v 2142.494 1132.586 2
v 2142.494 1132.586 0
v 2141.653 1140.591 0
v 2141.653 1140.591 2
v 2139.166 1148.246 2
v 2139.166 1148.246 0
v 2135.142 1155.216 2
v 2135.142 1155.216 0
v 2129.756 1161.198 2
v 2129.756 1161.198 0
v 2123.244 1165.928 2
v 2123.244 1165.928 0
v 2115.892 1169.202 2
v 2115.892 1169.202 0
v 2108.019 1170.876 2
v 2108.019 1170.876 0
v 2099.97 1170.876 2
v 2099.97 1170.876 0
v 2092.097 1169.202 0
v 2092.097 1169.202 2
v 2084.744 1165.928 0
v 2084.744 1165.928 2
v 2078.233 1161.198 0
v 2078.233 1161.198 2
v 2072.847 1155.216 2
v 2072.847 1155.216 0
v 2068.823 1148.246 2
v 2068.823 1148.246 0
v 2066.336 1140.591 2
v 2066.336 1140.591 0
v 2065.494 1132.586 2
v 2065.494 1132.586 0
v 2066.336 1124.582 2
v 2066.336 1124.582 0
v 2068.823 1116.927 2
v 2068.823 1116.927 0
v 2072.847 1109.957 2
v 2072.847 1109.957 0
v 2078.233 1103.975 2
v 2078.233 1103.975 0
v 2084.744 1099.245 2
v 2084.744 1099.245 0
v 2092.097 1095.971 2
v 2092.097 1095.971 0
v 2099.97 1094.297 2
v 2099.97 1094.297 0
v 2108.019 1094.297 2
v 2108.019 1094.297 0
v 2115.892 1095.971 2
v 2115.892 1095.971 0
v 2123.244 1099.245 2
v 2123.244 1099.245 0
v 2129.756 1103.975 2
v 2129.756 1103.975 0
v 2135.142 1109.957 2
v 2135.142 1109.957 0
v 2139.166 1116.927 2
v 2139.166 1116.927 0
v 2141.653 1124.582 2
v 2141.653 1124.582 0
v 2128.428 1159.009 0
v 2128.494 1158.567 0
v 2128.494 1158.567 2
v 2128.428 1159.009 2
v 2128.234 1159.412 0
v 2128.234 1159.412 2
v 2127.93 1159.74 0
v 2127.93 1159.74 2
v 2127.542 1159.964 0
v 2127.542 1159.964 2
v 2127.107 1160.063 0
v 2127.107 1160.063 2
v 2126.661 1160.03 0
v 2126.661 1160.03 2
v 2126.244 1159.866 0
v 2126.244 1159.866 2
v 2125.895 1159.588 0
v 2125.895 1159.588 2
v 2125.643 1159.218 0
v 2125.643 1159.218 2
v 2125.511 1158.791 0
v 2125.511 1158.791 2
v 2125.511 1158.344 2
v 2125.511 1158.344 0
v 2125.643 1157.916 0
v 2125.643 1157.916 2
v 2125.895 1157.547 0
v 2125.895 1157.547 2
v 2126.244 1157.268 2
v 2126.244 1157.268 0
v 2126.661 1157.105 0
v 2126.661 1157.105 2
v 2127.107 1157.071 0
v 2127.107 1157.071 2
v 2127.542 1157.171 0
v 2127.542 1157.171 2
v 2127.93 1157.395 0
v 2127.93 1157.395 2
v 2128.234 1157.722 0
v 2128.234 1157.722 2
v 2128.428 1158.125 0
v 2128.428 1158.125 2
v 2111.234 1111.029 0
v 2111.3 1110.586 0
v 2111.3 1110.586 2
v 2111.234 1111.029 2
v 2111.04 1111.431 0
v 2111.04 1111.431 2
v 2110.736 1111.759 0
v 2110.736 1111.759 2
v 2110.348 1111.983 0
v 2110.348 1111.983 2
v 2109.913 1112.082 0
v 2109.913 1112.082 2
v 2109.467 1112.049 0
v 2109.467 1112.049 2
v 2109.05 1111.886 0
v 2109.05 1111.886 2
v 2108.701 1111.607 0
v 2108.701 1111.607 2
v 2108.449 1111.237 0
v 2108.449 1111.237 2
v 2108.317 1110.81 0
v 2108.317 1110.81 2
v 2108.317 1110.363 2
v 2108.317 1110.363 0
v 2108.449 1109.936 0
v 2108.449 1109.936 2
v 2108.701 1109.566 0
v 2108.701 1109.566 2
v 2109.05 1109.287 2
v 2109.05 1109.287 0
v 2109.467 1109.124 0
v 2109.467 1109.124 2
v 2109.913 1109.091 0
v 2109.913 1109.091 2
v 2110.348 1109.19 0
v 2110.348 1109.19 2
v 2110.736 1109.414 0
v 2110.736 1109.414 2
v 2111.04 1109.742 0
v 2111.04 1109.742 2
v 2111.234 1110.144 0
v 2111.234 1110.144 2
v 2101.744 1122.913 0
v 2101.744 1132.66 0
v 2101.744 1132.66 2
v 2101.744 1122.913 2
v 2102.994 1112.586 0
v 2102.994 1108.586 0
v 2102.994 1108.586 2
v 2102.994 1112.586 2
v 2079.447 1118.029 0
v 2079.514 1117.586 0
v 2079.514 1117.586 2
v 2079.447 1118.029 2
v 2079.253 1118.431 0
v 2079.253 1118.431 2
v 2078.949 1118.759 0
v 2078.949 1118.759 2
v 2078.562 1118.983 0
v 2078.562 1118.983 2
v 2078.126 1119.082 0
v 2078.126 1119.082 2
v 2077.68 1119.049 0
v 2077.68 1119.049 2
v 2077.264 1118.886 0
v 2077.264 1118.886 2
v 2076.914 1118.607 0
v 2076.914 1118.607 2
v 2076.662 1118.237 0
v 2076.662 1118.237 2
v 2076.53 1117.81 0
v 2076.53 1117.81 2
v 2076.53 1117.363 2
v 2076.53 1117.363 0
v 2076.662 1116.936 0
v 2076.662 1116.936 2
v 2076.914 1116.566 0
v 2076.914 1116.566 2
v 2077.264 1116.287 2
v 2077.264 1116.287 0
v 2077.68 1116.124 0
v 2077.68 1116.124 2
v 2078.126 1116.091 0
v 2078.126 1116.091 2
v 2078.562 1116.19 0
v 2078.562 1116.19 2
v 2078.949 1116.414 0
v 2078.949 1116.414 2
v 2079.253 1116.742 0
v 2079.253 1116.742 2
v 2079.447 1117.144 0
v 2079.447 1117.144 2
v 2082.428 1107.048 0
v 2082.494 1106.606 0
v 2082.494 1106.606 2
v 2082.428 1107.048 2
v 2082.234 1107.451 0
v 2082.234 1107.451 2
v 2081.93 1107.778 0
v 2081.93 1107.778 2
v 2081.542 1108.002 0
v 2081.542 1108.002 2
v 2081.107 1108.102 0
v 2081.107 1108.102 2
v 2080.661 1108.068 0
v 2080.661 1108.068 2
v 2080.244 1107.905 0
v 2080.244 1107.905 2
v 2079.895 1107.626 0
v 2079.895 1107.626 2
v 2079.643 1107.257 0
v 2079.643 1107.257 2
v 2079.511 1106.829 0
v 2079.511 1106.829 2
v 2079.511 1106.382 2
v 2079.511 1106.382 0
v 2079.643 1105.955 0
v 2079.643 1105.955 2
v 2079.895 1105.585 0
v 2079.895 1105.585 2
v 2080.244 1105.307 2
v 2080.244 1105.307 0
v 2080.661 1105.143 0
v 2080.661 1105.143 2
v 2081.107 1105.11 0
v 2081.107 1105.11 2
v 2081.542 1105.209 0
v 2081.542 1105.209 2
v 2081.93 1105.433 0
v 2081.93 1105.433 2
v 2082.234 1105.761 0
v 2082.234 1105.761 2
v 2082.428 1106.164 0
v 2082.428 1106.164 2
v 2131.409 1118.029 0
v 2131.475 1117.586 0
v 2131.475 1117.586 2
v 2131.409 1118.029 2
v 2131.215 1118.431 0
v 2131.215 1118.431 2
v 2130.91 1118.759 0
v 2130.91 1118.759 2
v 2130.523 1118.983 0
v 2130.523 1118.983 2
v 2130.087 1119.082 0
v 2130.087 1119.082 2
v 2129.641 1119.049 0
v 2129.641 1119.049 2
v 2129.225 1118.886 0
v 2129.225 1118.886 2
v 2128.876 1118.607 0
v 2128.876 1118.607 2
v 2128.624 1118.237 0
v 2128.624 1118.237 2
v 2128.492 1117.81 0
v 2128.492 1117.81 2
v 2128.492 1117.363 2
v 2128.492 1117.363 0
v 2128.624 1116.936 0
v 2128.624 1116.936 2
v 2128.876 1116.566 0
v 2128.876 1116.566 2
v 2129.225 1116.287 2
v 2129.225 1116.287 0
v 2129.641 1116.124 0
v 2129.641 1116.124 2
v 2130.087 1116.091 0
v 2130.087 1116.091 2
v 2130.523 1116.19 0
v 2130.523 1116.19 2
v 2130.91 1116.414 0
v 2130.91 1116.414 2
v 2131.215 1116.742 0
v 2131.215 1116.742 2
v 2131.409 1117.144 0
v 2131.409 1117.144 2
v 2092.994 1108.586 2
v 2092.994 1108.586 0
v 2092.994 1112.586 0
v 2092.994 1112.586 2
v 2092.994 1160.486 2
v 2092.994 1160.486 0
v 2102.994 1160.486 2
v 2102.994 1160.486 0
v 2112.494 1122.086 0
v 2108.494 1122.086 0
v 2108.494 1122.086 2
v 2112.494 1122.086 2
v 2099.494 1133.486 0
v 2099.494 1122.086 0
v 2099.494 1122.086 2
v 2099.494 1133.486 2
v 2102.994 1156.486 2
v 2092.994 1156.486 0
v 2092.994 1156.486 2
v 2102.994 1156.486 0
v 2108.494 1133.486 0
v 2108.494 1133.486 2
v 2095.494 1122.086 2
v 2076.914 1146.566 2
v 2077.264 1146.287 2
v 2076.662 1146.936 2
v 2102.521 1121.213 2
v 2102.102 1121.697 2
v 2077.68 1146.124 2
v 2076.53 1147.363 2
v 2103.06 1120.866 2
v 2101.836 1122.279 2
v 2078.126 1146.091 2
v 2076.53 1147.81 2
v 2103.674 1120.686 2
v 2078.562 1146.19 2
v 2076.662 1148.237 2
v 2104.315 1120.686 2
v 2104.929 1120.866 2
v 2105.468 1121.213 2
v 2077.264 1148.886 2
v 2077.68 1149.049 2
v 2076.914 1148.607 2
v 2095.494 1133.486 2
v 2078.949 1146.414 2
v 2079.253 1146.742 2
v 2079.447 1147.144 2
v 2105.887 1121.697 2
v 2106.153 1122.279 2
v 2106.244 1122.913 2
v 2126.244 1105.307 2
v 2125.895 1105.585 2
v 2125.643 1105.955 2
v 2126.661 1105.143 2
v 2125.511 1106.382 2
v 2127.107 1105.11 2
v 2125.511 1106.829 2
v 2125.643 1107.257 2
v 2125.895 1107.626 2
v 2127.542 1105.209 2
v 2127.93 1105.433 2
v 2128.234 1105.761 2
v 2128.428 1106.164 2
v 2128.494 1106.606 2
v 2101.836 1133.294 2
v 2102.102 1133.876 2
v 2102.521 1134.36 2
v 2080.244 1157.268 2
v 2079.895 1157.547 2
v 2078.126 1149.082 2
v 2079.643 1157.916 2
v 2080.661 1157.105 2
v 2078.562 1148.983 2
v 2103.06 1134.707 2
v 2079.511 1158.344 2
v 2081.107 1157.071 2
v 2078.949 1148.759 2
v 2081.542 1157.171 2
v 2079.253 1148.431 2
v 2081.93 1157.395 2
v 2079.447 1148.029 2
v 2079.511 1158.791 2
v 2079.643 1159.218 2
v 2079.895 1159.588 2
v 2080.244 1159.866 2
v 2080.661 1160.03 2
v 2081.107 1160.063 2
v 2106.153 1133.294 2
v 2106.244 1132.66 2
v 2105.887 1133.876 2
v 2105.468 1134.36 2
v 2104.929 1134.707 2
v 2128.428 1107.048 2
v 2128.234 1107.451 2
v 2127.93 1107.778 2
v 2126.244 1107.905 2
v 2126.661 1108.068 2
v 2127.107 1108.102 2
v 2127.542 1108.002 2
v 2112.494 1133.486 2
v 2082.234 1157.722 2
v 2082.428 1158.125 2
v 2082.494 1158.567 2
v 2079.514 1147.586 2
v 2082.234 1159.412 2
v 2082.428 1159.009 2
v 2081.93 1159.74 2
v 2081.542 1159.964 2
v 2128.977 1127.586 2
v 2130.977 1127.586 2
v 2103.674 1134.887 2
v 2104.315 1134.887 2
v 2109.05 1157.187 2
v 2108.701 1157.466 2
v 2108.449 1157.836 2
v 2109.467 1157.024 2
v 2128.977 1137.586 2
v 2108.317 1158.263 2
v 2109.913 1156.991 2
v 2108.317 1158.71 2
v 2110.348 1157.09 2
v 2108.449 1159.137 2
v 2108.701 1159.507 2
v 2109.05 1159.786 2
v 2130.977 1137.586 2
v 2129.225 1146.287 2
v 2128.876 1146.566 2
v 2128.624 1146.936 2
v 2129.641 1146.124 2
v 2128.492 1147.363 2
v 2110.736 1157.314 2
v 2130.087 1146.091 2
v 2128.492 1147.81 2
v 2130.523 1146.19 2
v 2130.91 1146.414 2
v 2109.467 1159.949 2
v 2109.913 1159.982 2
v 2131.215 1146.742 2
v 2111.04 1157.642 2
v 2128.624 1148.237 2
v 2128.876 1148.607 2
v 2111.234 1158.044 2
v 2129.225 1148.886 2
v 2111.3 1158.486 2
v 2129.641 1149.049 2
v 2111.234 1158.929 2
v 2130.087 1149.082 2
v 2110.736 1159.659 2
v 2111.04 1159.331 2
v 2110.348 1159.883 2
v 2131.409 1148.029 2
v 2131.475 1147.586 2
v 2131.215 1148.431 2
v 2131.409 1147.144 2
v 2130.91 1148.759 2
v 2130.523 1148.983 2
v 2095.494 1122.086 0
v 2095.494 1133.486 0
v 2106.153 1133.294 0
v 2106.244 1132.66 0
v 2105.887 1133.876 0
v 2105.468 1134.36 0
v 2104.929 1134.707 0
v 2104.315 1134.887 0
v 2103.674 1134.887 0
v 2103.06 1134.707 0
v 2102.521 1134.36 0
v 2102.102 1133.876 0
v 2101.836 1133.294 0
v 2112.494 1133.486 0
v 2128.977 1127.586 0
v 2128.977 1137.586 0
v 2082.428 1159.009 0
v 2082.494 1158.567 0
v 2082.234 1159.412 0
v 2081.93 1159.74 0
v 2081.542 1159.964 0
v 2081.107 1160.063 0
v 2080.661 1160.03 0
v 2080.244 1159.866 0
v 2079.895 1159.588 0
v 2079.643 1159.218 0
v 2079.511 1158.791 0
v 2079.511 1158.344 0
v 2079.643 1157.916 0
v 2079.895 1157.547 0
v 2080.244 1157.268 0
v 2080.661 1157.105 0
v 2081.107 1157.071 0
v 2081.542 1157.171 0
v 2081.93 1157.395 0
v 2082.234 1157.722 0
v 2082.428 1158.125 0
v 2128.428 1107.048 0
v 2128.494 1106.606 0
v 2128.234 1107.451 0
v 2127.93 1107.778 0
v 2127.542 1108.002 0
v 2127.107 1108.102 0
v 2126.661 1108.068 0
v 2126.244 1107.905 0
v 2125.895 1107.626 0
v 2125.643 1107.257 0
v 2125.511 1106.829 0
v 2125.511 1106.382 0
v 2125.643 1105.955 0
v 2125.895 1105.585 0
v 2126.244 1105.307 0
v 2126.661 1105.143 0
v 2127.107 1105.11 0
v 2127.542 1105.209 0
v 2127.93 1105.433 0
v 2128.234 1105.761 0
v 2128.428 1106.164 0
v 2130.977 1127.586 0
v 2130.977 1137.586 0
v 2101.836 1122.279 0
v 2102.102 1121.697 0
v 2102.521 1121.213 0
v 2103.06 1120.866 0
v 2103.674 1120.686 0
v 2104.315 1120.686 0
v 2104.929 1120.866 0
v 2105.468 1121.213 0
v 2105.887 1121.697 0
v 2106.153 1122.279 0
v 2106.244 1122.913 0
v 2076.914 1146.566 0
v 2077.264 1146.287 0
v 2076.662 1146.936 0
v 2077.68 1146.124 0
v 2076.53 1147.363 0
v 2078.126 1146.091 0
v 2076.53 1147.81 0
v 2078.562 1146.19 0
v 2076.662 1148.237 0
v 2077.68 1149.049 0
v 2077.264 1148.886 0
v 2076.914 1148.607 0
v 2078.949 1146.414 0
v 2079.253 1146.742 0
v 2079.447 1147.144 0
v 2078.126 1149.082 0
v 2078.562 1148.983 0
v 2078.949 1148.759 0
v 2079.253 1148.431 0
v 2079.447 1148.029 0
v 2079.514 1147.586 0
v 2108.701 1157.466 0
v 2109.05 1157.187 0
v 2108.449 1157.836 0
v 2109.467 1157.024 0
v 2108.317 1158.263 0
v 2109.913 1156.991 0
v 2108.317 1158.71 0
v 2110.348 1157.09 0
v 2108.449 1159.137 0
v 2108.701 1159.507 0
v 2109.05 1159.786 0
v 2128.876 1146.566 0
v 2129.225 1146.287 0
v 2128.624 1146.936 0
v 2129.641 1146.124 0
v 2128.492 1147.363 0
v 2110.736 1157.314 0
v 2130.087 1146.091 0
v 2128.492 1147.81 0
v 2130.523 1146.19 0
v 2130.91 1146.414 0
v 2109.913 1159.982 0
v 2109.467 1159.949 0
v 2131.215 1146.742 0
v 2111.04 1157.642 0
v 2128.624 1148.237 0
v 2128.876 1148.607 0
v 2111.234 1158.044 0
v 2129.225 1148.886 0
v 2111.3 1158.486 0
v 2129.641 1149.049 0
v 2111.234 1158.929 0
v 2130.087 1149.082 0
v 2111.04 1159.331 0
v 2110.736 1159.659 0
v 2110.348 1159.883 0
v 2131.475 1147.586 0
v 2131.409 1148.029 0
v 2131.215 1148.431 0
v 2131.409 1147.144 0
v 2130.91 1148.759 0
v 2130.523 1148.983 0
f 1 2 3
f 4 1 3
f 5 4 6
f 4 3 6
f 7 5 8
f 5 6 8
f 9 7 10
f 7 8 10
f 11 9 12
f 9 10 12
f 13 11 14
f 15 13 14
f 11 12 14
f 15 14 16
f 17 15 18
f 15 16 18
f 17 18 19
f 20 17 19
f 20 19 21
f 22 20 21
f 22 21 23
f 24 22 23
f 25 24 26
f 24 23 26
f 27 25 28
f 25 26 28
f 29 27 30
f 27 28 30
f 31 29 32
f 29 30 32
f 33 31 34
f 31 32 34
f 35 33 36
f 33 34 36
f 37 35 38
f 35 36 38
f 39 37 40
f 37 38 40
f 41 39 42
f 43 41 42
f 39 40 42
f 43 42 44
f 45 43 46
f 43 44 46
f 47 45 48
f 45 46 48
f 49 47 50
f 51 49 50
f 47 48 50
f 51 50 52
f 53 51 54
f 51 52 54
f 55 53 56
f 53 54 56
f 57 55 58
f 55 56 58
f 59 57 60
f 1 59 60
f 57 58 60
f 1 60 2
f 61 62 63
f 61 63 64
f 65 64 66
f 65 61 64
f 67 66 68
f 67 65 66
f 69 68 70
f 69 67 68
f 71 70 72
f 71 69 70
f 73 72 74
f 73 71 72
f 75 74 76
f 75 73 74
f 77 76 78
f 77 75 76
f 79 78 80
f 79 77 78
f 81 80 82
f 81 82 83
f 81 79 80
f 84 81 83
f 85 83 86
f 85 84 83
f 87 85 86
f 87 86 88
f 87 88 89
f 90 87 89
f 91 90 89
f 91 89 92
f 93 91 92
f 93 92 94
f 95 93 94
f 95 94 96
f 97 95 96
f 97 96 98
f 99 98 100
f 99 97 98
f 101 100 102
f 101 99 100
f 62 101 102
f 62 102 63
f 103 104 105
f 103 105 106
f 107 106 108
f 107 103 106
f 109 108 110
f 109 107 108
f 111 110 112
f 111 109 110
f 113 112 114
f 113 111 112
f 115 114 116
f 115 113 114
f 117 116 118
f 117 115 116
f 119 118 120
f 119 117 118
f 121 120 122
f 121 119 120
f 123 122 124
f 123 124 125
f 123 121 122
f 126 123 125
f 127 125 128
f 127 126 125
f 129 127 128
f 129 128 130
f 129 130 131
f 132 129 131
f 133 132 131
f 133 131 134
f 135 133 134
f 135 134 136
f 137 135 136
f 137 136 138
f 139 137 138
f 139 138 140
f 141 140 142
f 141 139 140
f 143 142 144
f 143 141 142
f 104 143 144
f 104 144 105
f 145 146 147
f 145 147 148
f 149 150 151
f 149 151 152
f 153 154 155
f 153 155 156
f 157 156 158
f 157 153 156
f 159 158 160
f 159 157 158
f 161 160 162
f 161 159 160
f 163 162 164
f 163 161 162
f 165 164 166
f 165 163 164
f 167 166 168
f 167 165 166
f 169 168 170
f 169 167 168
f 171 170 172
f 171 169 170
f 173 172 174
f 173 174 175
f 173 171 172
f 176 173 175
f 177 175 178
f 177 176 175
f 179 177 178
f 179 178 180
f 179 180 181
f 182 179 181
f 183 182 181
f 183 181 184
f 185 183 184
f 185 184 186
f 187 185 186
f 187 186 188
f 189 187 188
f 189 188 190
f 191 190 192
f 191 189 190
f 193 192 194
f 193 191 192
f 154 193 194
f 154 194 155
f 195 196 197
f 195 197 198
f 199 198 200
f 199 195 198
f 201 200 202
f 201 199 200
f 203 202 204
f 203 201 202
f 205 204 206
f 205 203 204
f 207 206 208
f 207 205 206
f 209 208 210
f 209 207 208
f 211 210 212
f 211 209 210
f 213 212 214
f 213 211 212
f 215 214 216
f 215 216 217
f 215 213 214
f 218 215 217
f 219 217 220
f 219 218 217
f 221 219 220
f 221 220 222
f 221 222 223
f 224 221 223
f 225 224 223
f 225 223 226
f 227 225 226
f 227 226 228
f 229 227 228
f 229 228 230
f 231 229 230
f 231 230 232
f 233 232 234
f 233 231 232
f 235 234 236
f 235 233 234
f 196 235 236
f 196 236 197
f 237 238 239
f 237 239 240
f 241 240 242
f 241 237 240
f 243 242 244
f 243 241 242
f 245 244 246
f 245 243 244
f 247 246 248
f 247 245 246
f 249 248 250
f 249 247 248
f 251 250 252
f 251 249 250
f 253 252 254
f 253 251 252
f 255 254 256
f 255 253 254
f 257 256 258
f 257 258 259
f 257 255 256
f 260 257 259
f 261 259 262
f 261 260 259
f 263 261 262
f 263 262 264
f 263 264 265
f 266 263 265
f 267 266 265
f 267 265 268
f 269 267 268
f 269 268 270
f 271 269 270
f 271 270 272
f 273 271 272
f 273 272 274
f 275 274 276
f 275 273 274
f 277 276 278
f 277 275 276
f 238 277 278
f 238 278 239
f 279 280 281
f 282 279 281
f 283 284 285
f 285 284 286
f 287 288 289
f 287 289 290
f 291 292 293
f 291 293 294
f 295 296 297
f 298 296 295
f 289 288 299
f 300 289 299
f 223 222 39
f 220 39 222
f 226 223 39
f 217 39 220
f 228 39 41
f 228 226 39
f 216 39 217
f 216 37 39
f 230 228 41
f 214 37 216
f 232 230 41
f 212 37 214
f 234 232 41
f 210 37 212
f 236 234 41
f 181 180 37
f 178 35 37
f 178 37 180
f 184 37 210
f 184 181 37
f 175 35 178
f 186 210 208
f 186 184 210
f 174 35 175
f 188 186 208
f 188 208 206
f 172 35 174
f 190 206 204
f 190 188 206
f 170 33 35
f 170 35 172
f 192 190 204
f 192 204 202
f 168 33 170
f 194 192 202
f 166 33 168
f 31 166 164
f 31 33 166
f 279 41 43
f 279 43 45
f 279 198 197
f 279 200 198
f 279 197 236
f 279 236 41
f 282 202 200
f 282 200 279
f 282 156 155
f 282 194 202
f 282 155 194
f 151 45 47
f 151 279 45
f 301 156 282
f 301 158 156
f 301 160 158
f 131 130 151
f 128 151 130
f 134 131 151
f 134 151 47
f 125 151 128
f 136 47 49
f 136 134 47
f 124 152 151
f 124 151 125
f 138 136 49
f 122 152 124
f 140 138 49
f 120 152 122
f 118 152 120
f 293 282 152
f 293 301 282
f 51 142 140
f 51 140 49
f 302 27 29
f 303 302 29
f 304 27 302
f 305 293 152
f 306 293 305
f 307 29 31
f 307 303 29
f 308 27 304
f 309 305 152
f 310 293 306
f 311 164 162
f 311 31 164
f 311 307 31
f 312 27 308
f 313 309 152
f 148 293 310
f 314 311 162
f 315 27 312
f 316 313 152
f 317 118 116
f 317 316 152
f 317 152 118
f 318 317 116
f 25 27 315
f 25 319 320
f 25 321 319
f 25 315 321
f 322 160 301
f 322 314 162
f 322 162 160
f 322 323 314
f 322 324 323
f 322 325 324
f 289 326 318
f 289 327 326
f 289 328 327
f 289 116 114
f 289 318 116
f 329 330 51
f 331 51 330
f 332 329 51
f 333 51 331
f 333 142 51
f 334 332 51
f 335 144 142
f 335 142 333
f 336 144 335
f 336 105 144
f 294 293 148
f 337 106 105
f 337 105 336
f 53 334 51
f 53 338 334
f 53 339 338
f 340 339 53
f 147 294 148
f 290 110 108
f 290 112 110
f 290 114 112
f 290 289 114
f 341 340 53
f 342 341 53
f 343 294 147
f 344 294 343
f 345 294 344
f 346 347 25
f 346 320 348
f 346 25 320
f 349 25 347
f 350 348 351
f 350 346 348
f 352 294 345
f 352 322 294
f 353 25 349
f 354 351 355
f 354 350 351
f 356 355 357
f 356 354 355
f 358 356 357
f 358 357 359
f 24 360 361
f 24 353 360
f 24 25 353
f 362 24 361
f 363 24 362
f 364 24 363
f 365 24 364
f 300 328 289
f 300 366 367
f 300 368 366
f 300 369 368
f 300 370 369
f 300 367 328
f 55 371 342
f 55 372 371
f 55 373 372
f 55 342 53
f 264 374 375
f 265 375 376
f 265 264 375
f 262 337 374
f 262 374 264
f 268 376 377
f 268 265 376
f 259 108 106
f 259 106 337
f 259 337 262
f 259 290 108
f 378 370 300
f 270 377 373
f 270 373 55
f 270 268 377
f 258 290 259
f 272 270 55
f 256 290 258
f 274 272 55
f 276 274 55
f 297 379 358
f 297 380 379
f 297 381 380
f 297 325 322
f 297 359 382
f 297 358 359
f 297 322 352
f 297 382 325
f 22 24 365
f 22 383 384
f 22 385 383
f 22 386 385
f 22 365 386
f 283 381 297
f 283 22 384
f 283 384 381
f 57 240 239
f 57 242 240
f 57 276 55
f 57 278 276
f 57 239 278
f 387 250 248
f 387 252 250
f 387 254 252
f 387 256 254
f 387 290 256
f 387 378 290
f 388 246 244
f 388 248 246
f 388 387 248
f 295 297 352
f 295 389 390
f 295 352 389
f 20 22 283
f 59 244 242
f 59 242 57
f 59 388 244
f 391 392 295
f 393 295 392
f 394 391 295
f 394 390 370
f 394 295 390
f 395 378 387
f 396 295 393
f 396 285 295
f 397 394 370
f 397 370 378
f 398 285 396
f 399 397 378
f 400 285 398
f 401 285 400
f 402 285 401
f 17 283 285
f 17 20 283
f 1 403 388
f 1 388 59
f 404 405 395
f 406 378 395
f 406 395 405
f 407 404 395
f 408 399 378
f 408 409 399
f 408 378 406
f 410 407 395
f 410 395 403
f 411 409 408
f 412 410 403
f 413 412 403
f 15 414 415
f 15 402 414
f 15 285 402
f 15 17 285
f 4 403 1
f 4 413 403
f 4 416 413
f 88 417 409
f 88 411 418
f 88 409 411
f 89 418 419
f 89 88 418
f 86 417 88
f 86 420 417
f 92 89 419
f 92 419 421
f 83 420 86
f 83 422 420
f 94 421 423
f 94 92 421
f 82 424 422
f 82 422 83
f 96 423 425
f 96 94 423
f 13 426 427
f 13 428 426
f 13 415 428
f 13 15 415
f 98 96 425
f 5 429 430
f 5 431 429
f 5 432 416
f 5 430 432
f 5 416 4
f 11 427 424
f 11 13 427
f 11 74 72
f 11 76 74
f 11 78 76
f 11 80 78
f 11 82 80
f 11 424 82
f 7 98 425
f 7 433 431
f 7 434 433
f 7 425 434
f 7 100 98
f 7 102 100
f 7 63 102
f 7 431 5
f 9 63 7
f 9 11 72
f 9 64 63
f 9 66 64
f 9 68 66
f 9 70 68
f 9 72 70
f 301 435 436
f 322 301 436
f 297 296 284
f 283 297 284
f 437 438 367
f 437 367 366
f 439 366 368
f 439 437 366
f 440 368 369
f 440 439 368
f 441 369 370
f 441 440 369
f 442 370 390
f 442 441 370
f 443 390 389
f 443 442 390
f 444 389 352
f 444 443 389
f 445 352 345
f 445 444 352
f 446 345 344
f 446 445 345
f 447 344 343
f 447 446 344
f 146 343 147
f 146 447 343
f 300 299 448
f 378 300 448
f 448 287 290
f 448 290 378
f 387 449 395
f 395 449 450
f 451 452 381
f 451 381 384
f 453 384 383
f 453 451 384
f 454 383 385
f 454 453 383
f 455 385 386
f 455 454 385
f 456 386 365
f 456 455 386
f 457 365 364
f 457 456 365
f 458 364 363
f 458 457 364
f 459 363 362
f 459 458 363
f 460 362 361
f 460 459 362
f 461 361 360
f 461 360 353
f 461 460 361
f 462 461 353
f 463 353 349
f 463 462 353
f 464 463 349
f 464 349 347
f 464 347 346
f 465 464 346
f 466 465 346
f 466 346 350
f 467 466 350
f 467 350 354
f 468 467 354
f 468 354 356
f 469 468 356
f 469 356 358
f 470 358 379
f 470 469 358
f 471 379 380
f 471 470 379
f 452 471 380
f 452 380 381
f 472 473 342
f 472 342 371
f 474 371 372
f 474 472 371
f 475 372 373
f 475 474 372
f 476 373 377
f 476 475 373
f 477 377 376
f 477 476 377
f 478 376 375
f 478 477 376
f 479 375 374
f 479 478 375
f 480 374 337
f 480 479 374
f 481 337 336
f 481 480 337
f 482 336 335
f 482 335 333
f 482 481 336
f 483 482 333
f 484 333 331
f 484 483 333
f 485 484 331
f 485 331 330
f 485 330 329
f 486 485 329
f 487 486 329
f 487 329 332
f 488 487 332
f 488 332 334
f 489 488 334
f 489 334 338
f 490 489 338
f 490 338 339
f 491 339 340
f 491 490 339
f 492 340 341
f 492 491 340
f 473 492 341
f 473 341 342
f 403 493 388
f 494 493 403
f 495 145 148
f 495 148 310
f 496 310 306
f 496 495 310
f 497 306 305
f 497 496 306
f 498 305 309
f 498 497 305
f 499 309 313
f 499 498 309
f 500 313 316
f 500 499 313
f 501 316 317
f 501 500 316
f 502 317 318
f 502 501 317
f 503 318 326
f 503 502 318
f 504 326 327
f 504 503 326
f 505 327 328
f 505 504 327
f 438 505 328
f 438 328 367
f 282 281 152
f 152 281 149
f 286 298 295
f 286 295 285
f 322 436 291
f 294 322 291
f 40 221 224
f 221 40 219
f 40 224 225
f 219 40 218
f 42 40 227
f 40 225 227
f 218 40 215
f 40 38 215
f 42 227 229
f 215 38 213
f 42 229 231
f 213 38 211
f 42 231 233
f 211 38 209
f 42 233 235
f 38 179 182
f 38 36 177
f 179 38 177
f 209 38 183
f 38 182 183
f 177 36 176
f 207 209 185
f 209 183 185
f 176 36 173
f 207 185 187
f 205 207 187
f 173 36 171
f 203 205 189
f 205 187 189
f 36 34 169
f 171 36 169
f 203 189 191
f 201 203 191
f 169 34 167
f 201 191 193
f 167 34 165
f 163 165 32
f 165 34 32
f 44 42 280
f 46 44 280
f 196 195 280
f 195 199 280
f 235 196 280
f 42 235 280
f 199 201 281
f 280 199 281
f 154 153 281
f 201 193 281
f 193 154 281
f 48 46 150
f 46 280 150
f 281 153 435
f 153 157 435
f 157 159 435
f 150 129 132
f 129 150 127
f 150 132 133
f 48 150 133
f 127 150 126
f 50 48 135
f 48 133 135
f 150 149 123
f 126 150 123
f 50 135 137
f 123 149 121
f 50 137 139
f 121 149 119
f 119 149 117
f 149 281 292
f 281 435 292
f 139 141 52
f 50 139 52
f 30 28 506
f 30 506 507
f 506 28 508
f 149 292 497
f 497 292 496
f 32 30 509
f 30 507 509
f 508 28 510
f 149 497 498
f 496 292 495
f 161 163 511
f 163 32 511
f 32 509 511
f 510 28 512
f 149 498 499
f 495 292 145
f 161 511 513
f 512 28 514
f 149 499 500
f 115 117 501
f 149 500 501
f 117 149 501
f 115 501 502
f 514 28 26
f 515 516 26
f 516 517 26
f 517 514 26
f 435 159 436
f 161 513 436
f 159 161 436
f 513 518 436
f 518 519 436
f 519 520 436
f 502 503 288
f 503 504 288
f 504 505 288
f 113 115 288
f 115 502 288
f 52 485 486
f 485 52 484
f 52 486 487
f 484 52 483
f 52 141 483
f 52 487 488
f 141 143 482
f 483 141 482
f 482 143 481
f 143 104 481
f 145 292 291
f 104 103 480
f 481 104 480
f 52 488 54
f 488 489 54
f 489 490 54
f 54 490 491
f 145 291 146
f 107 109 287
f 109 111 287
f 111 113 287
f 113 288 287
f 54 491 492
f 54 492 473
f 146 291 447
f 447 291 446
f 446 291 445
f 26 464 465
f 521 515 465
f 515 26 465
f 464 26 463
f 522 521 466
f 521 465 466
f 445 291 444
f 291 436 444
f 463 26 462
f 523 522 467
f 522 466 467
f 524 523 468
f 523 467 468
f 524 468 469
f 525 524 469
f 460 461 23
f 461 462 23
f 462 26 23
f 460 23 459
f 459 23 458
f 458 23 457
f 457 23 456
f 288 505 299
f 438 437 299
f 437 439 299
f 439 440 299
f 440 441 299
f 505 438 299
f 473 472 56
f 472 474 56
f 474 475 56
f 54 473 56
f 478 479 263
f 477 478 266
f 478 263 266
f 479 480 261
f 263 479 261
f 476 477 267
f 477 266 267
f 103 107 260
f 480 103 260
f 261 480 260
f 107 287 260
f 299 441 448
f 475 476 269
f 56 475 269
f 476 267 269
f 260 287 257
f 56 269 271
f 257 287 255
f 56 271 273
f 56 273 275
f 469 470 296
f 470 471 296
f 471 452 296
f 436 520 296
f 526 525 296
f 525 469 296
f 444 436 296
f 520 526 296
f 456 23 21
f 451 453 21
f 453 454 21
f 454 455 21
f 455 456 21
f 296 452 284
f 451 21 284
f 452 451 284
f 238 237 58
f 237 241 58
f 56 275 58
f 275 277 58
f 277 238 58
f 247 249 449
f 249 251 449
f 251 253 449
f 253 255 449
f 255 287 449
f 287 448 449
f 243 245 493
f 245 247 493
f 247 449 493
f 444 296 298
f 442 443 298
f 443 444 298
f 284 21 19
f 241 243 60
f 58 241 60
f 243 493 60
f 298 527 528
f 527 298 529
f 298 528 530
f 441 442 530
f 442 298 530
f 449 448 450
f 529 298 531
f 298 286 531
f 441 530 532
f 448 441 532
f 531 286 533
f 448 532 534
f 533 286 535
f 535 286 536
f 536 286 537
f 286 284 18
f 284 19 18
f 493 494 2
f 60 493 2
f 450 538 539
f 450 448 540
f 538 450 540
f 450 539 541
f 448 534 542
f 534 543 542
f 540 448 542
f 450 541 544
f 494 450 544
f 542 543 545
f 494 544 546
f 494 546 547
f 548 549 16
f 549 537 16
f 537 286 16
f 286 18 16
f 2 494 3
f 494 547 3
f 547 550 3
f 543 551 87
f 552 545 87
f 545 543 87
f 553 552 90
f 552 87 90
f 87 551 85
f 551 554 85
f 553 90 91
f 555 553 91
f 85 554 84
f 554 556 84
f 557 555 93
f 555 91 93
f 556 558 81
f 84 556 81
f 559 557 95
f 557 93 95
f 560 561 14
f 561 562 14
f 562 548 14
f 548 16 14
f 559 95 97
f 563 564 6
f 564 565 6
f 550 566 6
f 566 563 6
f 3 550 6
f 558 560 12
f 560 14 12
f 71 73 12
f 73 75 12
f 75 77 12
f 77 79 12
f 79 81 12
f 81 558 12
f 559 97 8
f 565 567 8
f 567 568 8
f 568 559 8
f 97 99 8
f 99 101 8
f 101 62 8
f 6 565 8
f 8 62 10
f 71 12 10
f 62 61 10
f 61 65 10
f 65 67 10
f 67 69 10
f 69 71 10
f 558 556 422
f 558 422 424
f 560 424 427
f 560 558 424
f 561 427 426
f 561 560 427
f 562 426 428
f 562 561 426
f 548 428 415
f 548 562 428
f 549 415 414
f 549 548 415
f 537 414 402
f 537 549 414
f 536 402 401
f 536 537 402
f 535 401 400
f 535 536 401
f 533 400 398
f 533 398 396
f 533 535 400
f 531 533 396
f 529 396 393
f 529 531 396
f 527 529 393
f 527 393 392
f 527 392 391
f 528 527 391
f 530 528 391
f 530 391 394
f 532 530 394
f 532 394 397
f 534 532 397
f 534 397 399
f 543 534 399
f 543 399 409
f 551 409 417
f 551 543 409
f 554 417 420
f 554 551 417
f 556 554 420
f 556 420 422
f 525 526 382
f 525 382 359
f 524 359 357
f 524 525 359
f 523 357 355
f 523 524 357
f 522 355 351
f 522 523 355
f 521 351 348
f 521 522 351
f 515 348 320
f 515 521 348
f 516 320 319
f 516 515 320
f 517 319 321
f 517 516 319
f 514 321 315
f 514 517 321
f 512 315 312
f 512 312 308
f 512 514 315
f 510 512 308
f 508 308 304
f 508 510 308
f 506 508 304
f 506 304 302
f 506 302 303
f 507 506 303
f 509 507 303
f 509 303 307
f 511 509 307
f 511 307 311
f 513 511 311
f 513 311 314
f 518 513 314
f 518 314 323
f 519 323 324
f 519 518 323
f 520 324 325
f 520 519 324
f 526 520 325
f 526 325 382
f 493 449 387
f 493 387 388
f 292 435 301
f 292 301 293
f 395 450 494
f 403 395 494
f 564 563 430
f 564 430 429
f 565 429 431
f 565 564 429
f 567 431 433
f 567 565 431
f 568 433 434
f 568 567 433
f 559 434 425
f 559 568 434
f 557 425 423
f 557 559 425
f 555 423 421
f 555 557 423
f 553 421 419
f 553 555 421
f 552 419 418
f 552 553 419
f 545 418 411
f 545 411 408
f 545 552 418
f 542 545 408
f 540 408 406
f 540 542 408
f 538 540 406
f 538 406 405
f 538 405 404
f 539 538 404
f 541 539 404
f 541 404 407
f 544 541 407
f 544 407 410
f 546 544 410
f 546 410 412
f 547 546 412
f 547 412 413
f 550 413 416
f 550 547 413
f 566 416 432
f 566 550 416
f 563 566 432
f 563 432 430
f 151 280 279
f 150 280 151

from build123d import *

# Parameters (mm, degrees)
MODEL_R             = 38.5
MODEL_R_2           = 1.5
MODEL_W             = 10
MODEL_H             = 4
MODEL_W_2           = 4
MODEL_H_2           = 11.4
MODEL_W_3           = 2
MODEL_H_3           = 10
BOSS_EXTRUDE1_DEPTH = 2


with BuildPart() as part:
    # Model → Boss-Extrude1 (new body)
    with BuildSketch(Plane.XY):
        with Locations((2103.994457195, 1132.586491316)):
            Circle(MODEL_R)
        with Locations((2078.013695082, 1147.586491316)):
            Circle(MODEL_R_2, mode=Mode.SUBTRACT)
        with Locations((2129.975219309, 1147.586491316)):
            Circle(MODEL_R_2, mode=Mode.SUBTRACT)
        with Locations((2129.975219309, 1117.586491316)):
            Circle(MODEL_R_2, mode=Mode.SUBTRACT)
        with Locations((2078.013695082, 1117.586491316)):
            Circle(MODEL_R_2, mode=Mode.SUBTRACT)
        with Locations((2109.800475531, 1158.486491316)):
            Circle(MODEL_R_2, mode=Mode.SUBTRACT)
        with Locations((2109.800475531, 1110.586491316)):
            Circle(MODEL_R_2, mode=Mode.SUBTRACT)
        with Locations((2080.994457195, 1106.605729203)):
            Circle(MODEL_R_2, mode=Mode.SUBTRACT)
        with Locations((2080.994457195, 1158.56725343)):
            Circle(MODEL_R_2, mode=Mode.SUBTRACT)
        with Locations((2126.994457195, 1106.605729203)):
            Circle(MODEL_R_2, mode=Mode.SUBTRACT)
        with Locations((2126.994457195, 1158.56725343)):
            Circle(MODEL_R_2, mode=Mode.SUBTRACT)
        with Locations((2097.994457195, 1158.486491316)):
            Rectangle(MODEL_W, MODEL_H, mode=Mode.SUBTRACT)
        with Locations((2097.994457195, 1110.586491316)):
            Rectangle(MODEL_W, MODEL_H, mode=Mode.SUBTRACT)
        with Locations((2097.494457195, 1127.786491316)):
            Rectangle(MODEL_W_2, MODEL_H_2, mode=Mode.SUBTRACT)
        with Locations((2110.494457195, 1127.786491316)):
            Rectangle(MODEL_W_2, MODEL_H_2, mode=Mode.SUBTRACT)
        with BuildLine():
            Line((2101.744457195, 1132.659888489), (2101.744457195, 1122.913094144))
            ThreePointArc((2101.744457195, 1122.913094144), (2103.994457195, 1120.663094144), (2106.244457195, 1122.913094144))
            Line((2106.244457195, 1122.913094144), (2106.244457195, 1132.659888489))
            ThreePointArc((2106.244457195, 1132.659888489), (2103.994457195, 1134.909888489), (2101.744457195, 1132.659888489))
        make_face(mode=Mode.SUBTRACT)
        with Locations((2129.976886457, 1132.586491316)):
            Rectangle(MODEL_W_3, MODEL_H_3, mode=Mode.SUBTRACT)
    extrude(amount=BOSS_EXTRUDE1_DEPTH)


solid = part.part
